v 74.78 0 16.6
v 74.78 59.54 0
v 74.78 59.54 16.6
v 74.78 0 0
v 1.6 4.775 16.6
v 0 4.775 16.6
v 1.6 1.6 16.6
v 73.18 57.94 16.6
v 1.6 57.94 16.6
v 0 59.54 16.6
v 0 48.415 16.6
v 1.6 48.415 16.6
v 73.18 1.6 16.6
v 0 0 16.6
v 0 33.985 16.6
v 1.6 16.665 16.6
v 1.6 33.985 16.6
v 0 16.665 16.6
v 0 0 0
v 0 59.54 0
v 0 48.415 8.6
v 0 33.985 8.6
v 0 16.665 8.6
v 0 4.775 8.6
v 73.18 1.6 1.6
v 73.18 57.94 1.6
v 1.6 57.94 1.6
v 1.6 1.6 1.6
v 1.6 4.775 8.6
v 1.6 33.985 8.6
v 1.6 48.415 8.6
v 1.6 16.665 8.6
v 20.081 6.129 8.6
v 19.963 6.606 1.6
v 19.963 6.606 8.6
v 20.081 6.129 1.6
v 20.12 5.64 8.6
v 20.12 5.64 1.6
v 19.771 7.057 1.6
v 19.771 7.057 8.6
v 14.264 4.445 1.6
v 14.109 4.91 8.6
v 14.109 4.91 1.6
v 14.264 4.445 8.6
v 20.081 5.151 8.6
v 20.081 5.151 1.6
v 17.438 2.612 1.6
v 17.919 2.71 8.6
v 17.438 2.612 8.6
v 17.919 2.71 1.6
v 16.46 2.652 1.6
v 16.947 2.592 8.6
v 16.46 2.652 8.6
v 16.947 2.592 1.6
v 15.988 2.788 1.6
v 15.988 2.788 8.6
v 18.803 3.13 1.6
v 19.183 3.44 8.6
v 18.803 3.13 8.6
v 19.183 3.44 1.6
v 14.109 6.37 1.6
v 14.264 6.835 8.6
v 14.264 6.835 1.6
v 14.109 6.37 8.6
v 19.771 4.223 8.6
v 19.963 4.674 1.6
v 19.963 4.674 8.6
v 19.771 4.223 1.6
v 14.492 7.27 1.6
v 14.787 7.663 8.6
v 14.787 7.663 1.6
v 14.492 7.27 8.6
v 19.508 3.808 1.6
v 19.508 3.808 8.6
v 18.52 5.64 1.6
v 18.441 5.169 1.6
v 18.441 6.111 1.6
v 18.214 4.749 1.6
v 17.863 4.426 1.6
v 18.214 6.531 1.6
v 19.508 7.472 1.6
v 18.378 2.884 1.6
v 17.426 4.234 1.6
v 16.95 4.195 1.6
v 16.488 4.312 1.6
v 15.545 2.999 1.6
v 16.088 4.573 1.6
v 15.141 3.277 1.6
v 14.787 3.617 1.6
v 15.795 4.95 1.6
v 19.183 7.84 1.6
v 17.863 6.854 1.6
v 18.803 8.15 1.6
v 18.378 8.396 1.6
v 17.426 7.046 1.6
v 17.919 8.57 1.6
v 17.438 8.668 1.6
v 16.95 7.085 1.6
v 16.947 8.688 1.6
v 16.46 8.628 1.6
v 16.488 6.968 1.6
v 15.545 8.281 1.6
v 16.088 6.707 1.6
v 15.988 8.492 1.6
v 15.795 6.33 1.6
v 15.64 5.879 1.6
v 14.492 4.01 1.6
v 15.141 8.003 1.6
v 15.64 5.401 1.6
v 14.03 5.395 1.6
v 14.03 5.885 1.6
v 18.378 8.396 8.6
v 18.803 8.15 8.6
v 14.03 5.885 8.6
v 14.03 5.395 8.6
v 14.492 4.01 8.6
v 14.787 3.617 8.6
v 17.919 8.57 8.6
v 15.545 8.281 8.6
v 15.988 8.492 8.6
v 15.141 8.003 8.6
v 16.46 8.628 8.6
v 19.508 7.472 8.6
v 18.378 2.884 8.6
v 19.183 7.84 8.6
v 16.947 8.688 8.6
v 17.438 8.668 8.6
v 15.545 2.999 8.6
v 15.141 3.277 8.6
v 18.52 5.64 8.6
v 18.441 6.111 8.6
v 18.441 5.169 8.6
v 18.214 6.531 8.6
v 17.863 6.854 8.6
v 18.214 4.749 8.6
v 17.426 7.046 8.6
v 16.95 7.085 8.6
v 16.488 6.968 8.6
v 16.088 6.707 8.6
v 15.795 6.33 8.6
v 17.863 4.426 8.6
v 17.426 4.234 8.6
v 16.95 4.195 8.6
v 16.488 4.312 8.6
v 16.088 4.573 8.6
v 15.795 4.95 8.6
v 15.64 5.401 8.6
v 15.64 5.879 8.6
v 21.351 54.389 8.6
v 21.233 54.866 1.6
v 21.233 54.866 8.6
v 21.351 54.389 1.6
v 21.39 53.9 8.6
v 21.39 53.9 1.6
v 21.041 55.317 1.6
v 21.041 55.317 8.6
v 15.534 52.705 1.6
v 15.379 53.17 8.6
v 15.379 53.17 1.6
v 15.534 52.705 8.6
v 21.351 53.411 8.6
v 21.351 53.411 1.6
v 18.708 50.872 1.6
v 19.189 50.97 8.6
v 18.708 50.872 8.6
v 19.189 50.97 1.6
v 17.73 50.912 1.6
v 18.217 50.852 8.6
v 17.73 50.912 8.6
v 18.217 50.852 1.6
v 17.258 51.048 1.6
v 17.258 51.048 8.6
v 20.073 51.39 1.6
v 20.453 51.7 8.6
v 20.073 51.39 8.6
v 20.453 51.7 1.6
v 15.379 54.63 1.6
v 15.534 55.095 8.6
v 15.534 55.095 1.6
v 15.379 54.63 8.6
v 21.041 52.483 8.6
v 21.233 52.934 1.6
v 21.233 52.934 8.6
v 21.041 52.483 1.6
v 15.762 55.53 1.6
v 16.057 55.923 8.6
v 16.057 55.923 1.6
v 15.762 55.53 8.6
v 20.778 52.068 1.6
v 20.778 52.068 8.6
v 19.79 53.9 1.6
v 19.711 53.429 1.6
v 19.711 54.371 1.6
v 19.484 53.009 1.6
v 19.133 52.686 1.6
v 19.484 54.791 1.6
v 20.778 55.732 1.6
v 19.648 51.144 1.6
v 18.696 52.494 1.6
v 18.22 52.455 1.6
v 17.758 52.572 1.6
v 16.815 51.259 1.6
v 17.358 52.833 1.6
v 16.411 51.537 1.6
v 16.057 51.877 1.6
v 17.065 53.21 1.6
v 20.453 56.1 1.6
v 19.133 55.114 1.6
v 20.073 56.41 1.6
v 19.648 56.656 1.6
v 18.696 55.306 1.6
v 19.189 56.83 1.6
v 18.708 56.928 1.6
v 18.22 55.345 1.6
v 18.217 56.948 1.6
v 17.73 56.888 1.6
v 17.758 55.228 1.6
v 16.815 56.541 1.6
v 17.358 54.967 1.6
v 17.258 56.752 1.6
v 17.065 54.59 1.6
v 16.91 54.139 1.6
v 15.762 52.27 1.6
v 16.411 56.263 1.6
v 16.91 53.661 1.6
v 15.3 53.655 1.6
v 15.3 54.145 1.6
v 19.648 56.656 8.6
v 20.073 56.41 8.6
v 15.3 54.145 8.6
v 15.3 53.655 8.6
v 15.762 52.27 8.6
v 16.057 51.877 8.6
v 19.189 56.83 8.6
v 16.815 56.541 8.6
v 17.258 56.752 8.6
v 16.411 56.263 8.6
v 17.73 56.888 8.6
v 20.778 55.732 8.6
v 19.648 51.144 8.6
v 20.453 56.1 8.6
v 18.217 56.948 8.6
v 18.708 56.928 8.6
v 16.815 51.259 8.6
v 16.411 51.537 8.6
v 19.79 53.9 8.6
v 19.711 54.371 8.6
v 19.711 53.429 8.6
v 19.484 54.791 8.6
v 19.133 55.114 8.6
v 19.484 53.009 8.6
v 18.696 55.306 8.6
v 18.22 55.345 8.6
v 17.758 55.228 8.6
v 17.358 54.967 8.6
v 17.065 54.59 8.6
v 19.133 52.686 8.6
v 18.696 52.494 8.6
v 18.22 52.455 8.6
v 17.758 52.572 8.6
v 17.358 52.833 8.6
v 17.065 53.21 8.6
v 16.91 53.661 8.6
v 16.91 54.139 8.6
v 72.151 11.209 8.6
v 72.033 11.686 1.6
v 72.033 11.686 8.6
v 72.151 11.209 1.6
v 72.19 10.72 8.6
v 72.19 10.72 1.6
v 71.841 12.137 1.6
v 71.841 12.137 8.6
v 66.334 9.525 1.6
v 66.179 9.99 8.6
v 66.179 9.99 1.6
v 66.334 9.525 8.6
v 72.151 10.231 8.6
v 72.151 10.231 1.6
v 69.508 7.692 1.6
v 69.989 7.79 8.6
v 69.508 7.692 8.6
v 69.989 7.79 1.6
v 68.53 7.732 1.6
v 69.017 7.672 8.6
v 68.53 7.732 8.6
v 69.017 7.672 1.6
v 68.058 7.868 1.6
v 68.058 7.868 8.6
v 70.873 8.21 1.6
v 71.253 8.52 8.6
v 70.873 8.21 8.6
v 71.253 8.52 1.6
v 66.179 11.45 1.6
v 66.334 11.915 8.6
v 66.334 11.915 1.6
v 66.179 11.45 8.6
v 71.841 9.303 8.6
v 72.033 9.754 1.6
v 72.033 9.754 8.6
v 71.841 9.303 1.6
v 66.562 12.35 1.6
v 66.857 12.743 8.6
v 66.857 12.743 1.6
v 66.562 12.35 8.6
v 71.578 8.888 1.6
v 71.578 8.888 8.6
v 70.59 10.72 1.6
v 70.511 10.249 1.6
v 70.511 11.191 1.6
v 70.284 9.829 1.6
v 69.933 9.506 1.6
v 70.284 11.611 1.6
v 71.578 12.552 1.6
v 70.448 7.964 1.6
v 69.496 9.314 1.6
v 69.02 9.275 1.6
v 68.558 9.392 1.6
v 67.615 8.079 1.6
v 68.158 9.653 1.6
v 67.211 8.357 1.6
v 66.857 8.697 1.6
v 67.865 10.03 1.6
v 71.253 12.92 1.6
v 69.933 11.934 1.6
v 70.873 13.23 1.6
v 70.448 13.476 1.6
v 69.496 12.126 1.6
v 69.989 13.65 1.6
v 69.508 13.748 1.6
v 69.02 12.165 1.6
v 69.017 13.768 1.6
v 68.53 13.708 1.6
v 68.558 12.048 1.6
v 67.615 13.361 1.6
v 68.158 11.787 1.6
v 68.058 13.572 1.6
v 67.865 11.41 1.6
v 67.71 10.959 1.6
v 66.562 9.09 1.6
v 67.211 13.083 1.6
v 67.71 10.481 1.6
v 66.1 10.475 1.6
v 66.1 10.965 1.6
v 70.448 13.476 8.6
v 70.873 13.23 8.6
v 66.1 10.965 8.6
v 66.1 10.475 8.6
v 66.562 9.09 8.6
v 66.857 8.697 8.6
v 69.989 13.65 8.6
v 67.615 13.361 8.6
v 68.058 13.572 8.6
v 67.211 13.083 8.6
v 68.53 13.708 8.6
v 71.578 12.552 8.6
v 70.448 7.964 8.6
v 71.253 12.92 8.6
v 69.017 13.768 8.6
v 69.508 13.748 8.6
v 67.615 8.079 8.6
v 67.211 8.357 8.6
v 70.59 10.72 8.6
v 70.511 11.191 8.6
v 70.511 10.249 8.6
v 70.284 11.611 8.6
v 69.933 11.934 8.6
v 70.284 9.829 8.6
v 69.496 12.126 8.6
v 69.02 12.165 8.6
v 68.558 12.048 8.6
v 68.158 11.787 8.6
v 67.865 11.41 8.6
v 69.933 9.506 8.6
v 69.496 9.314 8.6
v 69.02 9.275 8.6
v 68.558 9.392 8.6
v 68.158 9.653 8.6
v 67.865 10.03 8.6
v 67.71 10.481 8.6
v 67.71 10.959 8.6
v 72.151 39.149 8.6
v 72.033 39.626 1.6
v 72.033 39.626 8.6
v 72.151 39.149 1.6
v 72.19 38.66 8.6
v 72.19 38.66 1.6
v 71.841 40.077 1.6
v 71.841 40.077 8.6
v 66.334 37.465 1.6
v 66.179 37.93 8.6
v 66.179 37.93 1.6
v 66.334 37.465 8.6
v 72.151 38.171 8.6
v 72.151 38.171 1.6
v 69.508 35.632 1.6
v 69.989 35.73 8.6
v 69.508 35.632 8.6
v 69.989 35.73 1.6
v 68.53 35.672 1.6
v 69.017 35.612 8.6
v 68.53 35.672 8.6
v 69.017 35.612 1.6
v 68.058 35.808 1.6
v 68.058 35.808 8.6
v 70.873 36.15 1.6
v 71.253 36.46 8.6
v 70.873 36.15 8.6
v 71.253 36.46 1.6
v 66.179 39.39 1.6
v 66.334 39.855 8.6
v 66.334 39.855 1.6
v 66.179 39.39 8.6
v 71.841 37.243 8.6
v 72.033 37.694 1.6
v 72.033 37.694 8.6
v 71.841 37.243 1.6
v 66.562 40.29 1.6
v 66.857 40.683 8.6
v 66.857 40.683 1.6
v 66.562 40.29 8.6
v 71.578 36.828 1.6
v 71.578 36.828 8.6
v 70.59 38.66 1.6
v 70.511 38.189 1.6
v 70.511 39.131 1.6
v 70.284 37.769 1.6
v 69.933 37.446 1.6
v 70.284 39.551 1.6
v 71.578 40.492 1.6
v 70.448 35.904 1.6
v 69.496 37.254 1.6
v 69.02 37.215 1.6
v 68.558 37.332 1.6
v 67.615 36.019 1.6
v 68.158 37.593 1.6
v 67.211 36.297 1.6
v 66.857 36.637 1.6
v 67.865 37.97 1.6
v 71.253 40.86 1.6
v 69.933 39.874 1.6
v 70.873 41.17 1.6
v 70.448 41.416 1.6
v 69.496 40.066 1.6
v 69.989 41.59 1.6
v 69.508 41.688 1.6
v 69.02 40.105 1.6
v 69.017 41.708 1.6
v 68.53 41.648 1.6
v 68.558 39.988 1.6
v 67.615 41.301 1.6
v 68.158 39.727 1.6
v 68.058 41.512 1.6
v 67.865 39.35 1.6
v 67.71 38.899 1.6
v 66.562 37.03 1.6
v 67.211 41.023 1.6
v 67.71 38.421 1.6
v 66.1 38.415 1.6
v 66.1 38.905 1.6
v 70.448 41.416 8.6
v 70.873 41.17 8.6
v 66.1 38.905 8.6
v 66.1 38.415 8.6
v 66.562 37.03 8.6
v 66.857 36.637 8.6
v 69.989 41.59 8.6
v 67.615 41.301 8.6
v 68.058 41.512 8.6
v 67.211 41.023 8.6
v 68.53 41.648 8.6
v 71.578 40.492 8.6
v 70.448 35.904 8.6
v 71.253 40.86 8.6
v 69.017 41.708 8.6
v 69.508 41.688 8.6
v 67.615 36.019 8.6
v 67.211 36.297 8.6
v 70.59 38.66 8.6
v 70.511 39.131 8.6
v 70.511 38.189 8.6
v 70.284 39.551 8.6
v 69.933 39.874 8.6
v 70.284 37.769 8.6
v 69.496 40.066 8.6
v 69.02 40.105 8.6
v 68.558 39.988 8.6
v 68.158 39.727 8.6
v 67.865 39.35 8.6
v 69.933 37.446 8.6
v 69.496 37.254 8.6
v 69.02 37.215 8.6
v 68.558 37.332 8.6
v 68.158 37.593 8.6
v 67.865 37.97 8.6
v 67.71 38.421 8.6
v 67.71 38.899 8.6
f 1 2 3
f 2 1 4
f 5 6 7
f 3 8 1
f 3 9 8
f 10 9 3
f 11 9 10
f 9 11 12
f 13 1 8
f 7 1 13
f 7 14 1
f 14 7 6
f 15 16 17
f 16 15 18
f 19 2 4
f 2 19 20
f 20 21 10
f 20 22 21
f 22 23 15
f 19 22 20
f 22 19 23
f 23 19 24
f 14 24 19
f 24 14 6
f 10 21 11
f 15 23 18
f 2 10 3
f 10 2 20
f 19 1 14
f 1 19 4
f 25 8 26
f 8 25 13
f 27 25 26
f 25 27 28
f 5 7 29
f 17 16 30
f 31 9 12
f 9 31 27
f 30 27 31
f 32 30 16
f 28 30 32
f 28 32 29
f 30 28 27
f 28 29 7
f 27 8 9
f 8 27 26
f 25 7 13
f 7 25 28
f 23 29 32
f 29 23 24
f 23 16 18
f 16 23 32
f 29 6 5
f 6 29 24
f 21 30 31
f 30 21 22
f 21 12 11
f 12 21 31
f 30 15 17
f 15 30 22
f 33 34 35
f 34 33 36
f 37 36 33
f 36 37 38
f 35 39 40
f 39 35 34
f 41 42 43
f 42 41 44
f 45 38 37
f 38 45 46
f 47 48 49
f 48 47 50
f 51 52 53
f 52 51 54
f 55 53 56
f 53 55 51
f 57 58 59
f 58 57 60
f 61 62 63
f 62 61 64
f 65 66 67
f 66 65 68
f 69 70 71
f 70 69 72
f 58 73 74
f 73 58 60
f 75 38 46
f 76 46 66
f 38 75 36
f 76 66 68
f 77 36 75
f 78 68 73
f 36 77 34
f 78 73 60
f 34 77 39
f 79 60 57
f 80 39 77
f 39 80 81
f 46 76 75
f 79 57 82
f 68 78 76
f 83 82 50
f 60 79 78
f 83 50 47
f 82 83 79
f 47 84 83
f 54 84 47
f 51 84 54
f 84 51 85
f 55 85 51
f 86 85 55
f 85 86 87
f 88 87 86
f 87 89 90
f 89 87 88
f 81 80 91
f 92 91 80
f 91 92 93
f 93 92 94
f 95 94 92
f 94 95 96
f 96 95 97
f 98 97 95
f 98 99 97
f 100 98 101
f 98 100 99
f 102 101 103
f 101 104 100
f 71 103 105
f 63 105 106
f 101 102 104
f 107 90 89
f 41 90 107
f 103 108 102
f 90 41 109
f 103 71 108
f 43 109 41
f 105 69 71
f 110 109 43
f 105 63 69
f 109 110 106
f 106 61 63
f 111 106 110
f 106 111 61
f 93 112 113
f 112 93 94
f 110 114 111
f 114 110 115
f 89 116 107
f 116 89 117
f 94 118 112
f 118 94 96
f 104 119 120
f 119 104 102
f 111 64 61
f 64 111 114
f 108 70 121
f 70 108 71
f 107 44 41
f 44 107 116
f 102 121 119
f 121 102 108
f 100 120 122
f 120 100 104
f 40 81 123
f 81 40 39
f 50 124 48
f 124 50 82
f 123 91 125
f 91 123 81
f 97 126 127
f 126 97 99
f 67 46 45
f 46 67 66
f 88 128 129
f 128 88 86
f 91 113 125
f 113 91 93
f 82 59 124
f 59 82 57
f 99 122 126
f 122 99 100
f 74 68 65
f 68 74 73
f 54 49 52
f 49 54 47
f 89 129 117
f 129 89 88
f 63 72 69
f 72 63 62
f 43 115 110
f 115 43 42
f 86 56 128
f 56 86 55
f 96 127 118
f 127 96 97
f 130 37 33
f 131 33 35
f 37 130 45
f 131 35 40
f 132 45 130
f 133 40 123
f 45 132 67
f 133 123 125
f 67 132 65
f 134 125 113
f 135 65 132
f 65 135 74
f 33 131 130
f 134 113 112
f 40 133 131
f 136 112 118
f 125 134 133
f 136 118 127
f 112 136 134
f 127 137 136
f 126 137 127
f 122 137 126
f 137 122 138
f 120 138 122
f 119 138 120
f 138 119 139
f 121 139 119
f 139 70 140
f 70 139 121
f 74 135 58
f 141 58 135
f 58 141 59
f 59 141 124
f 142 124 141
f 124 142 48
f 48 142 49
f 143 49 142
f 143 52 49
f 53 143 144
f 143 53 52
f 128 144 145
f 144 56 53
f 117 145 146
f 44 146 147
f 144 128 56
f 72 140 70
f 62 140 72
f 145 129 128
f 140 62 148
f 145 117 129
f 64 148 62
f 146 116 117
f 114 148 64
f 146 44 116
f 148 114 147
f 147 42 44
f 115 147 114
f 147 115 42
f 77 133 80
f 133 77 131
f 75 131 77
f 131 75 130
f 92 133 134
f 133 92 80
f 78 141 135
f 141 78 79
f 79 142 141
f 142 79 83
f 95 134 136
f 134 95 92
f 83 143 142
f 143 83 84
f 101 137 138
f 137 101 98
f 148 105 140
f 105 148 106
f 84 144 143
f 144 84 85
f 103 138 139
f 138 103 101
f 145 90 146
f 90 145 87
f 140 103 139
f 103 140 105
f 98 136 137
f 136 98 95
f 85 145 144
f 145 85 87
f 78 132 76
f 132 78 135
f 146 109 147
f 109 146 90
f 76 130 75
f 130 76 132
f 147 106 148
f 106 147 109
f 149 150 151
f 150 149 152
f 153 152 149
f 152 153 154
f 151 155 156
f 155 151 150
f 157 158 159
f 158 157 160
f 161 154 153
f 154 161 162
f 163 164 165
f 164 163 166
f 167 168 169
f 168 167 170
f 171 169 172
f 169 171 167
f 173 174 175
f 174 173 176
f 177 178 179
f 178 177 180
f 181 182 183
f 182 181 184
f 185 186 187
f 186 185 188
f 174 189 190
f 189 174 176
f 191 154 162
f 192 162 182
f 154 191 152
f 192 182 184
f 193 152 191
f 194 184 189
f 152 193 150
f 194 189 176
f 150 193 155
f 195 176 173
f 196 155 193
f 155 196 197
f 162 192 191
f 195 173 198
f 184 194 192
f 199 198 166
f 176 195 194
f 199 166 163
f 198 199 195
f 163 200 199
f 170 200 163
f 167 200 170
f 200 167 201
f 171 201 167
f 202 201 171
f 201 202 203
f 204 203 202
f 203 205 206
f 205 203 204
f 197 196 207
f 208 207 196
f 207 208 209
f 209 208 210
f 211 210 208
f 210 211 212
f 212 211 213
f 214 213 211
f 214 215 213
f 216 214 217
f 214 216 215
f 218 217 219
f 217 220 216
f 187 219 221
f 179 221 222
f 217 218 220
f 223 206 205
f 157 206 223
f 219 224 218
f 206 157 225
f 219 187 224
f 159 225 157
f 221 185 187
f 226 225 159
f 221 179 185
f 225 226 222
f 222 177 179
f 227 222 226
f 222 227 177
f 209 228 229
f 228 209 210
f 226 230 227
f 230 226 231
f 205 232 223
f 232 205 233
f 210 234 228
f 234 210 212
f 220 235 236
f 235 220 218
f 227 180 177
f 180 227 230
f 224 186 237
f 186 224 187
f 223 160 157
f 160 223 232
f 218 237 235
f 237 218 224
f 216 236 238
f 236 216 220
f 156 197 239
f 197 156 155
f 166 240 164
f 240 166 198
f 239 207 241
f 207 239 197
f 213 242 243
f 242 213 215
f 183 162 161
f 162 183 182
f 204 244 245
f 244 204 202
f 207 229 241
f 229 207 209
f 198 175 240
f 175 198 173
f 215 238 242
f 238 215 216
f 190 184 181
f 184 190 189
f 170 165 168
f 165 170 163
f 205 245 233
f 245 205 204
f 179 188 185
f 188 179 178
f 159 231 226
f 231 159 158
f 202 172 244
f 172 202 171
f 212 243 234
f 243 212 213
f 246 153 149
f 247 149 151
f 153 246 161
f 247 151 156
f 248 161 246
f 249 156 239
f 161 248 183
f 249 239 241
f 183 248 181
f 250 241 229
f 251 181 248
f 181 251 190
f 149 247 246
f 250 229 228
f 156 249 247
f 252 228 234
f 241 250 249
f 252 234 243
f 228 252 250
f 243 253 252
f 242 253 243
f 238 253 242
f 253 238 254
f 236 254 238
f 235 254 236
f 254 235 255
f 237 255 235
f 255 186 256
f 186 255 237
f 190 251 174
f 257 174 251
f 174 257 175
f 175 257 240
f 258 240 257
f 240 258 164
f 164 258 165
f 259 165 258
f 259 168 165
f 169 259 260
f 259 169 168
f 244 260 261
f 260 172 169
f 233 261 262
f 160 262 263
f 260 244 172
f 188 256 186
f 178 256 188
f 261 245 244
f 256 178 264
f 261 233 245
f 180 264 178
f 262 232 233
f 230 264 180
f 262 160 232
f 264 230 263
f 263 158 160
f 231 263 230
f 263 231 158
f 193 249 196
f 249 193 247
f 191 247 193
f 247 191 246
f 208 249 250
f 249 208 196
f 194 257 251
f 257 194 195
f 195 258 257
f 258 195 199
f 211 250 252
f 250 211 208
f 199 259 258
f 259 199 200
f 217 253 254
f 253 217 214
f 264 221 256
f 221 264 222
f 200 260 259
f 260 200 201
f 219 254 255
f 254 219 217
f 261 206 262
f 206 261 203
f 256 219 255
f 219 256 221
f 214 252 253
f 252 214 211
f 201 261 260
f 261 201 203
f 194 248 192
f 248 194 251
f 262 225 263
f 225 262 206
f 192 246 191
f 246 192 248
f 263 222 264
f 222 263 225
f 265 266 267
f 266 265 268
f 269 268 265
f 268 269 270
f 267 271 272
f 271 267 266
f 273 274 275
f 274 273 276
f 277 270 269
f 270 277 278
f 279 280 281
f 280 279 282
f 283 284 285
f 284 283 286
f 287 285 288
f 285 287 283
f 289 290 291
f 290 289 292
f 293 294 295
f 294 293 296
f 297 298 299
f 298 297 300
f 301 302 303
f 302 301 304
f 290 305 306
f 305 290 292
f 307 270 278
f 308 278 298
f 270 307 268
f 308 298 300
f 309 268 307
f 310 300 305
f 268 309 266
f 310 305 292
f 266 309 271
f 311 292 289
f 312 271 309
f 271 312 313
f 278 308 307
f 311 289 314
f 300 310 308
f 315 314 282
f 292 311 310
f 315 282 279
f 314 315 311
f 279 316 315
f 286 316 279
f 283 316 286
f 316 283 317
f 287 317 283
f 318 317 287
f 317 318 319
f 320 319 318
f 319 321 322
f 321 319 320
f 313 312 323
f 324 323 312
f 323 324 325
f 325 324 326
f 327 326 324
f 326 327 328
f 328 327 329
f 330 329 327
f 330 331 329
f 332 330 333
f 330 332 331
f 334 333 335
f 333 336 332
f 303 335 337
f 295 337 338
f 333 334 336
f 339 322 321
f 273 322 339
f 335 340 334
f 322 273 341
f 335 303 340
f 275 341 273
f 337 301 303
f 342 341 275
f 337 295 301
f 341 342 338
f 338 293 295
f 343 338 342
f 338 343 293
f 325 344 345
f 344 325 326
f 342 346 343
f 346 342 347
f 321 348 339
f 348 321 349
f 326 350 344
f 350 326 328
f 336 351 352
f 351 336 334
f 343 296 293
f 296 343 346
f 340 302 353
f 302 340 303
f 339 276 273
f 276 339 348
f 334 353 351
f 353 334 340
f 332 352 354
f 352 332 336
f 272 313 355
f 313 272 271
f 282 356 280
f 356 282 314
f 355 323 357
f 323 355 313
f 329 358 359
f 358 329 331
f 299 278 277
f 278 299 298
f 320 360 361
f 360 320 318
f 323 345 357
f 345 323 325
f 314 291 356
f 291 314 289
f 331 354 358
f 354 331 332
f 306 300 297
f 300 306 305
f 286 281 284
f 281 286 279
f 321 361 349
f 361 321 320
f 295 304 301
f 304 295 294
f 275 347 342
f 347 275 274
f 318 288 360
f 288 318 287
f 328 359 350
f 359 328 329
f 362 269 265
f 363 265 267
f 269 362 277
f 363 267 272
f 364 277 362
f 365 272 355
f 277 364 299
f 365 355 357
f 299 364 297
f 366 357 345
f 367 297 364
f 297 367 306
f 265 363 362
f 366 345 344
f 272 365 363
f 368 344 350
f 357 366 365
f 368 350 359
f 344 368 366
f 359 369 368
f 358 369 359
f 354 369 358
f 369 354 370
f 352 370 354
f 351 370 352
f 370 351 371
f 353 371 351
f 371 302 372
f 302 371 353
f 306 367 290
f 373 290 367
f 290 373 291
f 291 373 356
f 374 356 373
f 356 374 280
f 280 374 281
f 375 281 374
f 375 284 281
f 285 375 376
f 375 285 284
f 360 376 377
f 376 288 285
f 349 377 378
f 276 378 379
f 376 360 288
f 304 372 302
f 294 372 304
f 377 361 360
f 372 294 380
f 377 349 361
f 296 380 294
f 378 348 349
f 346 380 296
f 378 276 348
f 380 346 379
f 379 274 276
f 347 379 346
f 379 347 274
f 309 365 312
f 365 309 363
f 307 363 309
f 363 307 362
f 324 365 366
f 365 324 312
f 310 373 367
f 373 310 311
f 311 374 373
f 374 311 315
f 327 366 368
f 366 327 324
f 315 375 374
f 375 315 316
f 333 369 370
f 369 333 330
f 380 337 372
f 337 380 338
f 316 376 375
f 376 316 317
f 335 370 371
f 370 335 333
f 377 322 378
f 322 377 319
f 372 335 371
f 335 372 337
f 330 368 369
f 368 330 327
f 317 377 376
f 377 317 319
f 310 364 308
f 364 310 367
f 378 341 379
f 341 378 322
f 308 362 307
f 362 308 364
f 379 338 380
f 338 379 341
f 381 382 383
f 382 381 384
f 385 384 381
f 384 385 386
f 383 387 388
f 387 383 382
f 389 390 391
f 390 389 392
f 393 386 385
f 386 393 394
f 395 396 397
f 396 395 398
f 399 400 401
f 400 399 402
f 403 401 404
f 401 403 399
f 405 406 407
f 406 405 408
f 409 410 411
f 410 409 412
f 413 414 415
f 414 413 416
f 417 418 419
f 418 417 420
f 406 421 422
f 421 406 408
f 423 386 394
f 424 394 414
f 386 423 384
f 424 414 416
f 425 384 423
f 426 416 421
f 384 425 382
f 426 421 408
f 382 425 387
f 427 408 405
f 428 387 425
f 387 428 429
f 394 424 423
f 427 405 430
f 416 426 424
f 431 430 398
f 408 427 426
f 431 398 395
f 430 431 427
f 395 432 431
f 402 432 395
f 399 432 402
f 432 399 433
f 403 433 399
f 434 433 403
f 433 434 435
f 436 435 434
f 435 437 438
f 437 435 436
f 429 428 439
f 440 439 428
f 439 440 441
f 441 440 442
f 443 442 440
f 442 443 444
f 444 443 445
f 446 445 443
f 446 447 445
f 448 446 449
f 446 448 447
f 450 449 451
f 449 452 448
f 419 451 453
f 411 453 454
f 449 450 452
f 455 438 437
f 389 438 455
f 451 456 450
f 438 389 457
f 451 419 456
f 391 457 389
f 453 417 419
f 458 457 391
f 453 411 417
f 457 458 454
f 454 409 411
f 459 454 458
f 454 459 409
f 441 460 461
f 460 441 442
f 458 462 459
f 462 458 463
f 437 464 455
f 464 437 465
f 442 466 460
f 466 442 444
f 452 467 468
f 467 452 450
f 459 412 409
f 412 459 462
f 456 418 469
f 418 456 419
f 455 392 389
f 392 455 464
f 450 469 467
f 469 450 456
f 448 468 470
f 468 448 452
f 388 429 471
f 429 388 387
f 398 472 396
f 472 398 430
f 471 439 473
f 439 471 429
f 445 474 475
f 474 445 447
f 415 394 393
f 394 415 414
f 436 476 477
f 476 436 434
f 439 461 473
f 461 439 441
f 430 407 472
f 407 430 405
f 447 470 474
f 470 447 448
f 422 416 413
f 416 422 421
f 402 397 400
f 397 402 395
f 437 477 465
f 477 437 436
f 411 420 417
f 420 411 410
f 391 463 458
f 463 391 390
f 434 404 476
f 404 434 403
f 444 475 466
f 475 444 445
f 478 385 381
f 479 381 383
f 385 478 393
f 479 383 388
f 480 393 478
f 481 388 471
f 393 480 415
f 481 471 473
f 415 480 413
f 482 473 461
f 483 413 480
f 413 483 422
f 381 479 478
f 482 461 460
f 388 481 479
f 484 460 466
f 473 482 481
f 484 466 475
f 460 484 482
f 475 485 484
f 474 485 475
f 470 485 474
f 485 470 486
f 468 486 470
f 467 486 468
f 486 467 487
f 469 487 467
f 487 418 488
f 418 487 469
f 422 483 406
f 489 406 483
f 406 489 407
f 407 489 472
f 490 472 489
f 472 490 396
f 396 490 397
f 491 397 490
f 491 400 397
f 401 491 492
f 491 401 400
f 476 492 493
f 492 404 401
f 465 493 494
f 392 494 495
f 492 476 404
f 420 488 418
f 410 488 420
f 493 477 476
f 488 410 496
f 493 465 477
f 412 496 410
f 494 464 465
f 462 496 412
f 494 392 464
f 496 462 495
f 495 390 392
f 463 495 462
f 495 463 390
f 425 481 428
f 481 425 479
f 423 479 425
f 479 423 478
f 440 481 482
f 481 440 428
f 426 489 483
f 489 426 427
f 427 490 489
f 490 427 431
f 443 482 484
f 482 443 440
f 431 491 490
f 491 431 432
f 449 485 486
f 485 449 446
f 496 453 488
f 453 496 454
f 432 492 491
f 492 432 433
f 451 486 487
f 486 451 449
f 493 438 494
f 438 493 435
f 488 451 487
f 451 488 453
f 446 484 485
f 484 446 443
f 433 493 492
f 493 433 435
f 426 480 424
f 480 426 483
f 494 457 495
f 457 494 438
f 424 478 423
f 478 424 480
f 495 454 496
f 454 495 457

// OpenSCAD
//design and code by emanresu (http://www.thingiverse.com/Emanresu)
//generates a simple tray with standoffs for an arduino to sit in


//CUSTOMIZER VARIABLES

//arduino type
arduino_type = "Uno"; //[Uno,Mega]

//thickness of side walls and bottom (mm)
thick = 1.6;
//height of side walls (mm)
wall_height = 15;
//height of standoff (mm)
standoff_height = 7;
//standoff hole diameter (mm)
standoff_hole_diameter = 2.9;
//standoff thickness (mm)
standoff_thick = 1.6;
//clearance between arduino and sidewalls (mm)
clearance = 1.5;


/* [Hidden] */

//sets openSCAD resolution for nice, round holes
$fa=1;
$fs=0.5;


   ///////////////
  //  Modules  //
 ///////////////

module Arduino_standoffs() {
	// body...
	//arranging standoffs
	translate([13.97, 2.54, standoff_height/2]) {
		difference() {
			cylinder(r=standoff_hole_diameter/2+standoff_thick, h=standoff_height, center=true);
			cylinder(r=standoff_hole_diameter/2, h=standoff_height+1, center=true);
		}	
	}
	translate([15.24, 50.8, standoff_height/2]) {
		difference() {
			cylinder(r=standoff_hole_diameter/2+standoff_thick, h=standoff_height, center=true);
			cylinder(r=standoff_hole_diameter/2, h=standoff_height+1, center=true);
		}	
	}
	translate([66.04, 7.62, standoff_height/2]) {
		difference() {
			cylinder(r=standoff_hole_diameter/2+standoff_thick, h=standoff_height, center=true);
			cylinder(r=standoff_hole_diameter/2, h=standoff_height+1, center=true);
		}	
	}
	translate([66.04, 35.56, standoff_height/2]) {
		difference() {
			cylinder(r=standoff_hole_diameter/2+standoff_thick, h=standoff_height, center=true);
			cylinder(r=standoff_hole_diameter/2, h=standoff_height+1, center=true);
		}	
	}
	
	if (arduino_type == "Mega") {
		//adds extra standoffs for Mega, if specified
		translate([90.17, 50.8, standoff_height/2]) {
			difference() {
				cylinder(r=standoff_hole_diameter/2+standoff_thick, h=standoff_height, center=true);
				cylinder(r=standoff_hole_diameter/2, h=standoff_height+1, center=true);
			}	
		}
		translate([96.52, 2.54, standoff_height/2]) {
			difference() {
				cylinder(r=standoff_hole_diameter/2+standoff_thick, h=standoff_height, center=true);
				cylinder(r=standoff_hole_diameter/2, h=standoff_height+1, center=true);
			}	
		}	
	}
}

module Arduino_case_body() {
	// body...
	
	//sets length for type of arduino specified, 101.6 mm for Mega, 68.58 mm for Uno
	base_x = (arduino_type == "Mega" ? 101.6 : 68.58);
	
	difference() {
		cube(size=[base_x+2*thick+2*clearance, 53.34+2*thick+2*clearance, wall_height+thick], center=false);
		translate([thick, thick, thick]) {
			//main compartment
			cube(size=[base_x+2*clearance, 53.34+2*clearance, wall_height+1], center=false);
		}
		translate([thick/2, 7.62+thick+clearance, wall_height/2+thick+standoff_height]) {
			//power plug gap
			cube(size=[thick+1, 8.89+2*clearance, wall_height], center=true);
		}
		translate([thick/2, 38.1+thick+clearance, wall_height/2+thick+standoff_height]) {
			//USB plug gap
			cube(size=[thick+1, 11.43+2*clearance, wall_height], center=true);
		}
	}	
}


   ////////////////////
  //  Control Code  //
 ////////////////////

union() {
	//Joins case body with standoffs
	Arduino_case_body();
	translate([thick+clearance, thick+clearance, thick]) {
		Arduino_standoffs();
	}
}
